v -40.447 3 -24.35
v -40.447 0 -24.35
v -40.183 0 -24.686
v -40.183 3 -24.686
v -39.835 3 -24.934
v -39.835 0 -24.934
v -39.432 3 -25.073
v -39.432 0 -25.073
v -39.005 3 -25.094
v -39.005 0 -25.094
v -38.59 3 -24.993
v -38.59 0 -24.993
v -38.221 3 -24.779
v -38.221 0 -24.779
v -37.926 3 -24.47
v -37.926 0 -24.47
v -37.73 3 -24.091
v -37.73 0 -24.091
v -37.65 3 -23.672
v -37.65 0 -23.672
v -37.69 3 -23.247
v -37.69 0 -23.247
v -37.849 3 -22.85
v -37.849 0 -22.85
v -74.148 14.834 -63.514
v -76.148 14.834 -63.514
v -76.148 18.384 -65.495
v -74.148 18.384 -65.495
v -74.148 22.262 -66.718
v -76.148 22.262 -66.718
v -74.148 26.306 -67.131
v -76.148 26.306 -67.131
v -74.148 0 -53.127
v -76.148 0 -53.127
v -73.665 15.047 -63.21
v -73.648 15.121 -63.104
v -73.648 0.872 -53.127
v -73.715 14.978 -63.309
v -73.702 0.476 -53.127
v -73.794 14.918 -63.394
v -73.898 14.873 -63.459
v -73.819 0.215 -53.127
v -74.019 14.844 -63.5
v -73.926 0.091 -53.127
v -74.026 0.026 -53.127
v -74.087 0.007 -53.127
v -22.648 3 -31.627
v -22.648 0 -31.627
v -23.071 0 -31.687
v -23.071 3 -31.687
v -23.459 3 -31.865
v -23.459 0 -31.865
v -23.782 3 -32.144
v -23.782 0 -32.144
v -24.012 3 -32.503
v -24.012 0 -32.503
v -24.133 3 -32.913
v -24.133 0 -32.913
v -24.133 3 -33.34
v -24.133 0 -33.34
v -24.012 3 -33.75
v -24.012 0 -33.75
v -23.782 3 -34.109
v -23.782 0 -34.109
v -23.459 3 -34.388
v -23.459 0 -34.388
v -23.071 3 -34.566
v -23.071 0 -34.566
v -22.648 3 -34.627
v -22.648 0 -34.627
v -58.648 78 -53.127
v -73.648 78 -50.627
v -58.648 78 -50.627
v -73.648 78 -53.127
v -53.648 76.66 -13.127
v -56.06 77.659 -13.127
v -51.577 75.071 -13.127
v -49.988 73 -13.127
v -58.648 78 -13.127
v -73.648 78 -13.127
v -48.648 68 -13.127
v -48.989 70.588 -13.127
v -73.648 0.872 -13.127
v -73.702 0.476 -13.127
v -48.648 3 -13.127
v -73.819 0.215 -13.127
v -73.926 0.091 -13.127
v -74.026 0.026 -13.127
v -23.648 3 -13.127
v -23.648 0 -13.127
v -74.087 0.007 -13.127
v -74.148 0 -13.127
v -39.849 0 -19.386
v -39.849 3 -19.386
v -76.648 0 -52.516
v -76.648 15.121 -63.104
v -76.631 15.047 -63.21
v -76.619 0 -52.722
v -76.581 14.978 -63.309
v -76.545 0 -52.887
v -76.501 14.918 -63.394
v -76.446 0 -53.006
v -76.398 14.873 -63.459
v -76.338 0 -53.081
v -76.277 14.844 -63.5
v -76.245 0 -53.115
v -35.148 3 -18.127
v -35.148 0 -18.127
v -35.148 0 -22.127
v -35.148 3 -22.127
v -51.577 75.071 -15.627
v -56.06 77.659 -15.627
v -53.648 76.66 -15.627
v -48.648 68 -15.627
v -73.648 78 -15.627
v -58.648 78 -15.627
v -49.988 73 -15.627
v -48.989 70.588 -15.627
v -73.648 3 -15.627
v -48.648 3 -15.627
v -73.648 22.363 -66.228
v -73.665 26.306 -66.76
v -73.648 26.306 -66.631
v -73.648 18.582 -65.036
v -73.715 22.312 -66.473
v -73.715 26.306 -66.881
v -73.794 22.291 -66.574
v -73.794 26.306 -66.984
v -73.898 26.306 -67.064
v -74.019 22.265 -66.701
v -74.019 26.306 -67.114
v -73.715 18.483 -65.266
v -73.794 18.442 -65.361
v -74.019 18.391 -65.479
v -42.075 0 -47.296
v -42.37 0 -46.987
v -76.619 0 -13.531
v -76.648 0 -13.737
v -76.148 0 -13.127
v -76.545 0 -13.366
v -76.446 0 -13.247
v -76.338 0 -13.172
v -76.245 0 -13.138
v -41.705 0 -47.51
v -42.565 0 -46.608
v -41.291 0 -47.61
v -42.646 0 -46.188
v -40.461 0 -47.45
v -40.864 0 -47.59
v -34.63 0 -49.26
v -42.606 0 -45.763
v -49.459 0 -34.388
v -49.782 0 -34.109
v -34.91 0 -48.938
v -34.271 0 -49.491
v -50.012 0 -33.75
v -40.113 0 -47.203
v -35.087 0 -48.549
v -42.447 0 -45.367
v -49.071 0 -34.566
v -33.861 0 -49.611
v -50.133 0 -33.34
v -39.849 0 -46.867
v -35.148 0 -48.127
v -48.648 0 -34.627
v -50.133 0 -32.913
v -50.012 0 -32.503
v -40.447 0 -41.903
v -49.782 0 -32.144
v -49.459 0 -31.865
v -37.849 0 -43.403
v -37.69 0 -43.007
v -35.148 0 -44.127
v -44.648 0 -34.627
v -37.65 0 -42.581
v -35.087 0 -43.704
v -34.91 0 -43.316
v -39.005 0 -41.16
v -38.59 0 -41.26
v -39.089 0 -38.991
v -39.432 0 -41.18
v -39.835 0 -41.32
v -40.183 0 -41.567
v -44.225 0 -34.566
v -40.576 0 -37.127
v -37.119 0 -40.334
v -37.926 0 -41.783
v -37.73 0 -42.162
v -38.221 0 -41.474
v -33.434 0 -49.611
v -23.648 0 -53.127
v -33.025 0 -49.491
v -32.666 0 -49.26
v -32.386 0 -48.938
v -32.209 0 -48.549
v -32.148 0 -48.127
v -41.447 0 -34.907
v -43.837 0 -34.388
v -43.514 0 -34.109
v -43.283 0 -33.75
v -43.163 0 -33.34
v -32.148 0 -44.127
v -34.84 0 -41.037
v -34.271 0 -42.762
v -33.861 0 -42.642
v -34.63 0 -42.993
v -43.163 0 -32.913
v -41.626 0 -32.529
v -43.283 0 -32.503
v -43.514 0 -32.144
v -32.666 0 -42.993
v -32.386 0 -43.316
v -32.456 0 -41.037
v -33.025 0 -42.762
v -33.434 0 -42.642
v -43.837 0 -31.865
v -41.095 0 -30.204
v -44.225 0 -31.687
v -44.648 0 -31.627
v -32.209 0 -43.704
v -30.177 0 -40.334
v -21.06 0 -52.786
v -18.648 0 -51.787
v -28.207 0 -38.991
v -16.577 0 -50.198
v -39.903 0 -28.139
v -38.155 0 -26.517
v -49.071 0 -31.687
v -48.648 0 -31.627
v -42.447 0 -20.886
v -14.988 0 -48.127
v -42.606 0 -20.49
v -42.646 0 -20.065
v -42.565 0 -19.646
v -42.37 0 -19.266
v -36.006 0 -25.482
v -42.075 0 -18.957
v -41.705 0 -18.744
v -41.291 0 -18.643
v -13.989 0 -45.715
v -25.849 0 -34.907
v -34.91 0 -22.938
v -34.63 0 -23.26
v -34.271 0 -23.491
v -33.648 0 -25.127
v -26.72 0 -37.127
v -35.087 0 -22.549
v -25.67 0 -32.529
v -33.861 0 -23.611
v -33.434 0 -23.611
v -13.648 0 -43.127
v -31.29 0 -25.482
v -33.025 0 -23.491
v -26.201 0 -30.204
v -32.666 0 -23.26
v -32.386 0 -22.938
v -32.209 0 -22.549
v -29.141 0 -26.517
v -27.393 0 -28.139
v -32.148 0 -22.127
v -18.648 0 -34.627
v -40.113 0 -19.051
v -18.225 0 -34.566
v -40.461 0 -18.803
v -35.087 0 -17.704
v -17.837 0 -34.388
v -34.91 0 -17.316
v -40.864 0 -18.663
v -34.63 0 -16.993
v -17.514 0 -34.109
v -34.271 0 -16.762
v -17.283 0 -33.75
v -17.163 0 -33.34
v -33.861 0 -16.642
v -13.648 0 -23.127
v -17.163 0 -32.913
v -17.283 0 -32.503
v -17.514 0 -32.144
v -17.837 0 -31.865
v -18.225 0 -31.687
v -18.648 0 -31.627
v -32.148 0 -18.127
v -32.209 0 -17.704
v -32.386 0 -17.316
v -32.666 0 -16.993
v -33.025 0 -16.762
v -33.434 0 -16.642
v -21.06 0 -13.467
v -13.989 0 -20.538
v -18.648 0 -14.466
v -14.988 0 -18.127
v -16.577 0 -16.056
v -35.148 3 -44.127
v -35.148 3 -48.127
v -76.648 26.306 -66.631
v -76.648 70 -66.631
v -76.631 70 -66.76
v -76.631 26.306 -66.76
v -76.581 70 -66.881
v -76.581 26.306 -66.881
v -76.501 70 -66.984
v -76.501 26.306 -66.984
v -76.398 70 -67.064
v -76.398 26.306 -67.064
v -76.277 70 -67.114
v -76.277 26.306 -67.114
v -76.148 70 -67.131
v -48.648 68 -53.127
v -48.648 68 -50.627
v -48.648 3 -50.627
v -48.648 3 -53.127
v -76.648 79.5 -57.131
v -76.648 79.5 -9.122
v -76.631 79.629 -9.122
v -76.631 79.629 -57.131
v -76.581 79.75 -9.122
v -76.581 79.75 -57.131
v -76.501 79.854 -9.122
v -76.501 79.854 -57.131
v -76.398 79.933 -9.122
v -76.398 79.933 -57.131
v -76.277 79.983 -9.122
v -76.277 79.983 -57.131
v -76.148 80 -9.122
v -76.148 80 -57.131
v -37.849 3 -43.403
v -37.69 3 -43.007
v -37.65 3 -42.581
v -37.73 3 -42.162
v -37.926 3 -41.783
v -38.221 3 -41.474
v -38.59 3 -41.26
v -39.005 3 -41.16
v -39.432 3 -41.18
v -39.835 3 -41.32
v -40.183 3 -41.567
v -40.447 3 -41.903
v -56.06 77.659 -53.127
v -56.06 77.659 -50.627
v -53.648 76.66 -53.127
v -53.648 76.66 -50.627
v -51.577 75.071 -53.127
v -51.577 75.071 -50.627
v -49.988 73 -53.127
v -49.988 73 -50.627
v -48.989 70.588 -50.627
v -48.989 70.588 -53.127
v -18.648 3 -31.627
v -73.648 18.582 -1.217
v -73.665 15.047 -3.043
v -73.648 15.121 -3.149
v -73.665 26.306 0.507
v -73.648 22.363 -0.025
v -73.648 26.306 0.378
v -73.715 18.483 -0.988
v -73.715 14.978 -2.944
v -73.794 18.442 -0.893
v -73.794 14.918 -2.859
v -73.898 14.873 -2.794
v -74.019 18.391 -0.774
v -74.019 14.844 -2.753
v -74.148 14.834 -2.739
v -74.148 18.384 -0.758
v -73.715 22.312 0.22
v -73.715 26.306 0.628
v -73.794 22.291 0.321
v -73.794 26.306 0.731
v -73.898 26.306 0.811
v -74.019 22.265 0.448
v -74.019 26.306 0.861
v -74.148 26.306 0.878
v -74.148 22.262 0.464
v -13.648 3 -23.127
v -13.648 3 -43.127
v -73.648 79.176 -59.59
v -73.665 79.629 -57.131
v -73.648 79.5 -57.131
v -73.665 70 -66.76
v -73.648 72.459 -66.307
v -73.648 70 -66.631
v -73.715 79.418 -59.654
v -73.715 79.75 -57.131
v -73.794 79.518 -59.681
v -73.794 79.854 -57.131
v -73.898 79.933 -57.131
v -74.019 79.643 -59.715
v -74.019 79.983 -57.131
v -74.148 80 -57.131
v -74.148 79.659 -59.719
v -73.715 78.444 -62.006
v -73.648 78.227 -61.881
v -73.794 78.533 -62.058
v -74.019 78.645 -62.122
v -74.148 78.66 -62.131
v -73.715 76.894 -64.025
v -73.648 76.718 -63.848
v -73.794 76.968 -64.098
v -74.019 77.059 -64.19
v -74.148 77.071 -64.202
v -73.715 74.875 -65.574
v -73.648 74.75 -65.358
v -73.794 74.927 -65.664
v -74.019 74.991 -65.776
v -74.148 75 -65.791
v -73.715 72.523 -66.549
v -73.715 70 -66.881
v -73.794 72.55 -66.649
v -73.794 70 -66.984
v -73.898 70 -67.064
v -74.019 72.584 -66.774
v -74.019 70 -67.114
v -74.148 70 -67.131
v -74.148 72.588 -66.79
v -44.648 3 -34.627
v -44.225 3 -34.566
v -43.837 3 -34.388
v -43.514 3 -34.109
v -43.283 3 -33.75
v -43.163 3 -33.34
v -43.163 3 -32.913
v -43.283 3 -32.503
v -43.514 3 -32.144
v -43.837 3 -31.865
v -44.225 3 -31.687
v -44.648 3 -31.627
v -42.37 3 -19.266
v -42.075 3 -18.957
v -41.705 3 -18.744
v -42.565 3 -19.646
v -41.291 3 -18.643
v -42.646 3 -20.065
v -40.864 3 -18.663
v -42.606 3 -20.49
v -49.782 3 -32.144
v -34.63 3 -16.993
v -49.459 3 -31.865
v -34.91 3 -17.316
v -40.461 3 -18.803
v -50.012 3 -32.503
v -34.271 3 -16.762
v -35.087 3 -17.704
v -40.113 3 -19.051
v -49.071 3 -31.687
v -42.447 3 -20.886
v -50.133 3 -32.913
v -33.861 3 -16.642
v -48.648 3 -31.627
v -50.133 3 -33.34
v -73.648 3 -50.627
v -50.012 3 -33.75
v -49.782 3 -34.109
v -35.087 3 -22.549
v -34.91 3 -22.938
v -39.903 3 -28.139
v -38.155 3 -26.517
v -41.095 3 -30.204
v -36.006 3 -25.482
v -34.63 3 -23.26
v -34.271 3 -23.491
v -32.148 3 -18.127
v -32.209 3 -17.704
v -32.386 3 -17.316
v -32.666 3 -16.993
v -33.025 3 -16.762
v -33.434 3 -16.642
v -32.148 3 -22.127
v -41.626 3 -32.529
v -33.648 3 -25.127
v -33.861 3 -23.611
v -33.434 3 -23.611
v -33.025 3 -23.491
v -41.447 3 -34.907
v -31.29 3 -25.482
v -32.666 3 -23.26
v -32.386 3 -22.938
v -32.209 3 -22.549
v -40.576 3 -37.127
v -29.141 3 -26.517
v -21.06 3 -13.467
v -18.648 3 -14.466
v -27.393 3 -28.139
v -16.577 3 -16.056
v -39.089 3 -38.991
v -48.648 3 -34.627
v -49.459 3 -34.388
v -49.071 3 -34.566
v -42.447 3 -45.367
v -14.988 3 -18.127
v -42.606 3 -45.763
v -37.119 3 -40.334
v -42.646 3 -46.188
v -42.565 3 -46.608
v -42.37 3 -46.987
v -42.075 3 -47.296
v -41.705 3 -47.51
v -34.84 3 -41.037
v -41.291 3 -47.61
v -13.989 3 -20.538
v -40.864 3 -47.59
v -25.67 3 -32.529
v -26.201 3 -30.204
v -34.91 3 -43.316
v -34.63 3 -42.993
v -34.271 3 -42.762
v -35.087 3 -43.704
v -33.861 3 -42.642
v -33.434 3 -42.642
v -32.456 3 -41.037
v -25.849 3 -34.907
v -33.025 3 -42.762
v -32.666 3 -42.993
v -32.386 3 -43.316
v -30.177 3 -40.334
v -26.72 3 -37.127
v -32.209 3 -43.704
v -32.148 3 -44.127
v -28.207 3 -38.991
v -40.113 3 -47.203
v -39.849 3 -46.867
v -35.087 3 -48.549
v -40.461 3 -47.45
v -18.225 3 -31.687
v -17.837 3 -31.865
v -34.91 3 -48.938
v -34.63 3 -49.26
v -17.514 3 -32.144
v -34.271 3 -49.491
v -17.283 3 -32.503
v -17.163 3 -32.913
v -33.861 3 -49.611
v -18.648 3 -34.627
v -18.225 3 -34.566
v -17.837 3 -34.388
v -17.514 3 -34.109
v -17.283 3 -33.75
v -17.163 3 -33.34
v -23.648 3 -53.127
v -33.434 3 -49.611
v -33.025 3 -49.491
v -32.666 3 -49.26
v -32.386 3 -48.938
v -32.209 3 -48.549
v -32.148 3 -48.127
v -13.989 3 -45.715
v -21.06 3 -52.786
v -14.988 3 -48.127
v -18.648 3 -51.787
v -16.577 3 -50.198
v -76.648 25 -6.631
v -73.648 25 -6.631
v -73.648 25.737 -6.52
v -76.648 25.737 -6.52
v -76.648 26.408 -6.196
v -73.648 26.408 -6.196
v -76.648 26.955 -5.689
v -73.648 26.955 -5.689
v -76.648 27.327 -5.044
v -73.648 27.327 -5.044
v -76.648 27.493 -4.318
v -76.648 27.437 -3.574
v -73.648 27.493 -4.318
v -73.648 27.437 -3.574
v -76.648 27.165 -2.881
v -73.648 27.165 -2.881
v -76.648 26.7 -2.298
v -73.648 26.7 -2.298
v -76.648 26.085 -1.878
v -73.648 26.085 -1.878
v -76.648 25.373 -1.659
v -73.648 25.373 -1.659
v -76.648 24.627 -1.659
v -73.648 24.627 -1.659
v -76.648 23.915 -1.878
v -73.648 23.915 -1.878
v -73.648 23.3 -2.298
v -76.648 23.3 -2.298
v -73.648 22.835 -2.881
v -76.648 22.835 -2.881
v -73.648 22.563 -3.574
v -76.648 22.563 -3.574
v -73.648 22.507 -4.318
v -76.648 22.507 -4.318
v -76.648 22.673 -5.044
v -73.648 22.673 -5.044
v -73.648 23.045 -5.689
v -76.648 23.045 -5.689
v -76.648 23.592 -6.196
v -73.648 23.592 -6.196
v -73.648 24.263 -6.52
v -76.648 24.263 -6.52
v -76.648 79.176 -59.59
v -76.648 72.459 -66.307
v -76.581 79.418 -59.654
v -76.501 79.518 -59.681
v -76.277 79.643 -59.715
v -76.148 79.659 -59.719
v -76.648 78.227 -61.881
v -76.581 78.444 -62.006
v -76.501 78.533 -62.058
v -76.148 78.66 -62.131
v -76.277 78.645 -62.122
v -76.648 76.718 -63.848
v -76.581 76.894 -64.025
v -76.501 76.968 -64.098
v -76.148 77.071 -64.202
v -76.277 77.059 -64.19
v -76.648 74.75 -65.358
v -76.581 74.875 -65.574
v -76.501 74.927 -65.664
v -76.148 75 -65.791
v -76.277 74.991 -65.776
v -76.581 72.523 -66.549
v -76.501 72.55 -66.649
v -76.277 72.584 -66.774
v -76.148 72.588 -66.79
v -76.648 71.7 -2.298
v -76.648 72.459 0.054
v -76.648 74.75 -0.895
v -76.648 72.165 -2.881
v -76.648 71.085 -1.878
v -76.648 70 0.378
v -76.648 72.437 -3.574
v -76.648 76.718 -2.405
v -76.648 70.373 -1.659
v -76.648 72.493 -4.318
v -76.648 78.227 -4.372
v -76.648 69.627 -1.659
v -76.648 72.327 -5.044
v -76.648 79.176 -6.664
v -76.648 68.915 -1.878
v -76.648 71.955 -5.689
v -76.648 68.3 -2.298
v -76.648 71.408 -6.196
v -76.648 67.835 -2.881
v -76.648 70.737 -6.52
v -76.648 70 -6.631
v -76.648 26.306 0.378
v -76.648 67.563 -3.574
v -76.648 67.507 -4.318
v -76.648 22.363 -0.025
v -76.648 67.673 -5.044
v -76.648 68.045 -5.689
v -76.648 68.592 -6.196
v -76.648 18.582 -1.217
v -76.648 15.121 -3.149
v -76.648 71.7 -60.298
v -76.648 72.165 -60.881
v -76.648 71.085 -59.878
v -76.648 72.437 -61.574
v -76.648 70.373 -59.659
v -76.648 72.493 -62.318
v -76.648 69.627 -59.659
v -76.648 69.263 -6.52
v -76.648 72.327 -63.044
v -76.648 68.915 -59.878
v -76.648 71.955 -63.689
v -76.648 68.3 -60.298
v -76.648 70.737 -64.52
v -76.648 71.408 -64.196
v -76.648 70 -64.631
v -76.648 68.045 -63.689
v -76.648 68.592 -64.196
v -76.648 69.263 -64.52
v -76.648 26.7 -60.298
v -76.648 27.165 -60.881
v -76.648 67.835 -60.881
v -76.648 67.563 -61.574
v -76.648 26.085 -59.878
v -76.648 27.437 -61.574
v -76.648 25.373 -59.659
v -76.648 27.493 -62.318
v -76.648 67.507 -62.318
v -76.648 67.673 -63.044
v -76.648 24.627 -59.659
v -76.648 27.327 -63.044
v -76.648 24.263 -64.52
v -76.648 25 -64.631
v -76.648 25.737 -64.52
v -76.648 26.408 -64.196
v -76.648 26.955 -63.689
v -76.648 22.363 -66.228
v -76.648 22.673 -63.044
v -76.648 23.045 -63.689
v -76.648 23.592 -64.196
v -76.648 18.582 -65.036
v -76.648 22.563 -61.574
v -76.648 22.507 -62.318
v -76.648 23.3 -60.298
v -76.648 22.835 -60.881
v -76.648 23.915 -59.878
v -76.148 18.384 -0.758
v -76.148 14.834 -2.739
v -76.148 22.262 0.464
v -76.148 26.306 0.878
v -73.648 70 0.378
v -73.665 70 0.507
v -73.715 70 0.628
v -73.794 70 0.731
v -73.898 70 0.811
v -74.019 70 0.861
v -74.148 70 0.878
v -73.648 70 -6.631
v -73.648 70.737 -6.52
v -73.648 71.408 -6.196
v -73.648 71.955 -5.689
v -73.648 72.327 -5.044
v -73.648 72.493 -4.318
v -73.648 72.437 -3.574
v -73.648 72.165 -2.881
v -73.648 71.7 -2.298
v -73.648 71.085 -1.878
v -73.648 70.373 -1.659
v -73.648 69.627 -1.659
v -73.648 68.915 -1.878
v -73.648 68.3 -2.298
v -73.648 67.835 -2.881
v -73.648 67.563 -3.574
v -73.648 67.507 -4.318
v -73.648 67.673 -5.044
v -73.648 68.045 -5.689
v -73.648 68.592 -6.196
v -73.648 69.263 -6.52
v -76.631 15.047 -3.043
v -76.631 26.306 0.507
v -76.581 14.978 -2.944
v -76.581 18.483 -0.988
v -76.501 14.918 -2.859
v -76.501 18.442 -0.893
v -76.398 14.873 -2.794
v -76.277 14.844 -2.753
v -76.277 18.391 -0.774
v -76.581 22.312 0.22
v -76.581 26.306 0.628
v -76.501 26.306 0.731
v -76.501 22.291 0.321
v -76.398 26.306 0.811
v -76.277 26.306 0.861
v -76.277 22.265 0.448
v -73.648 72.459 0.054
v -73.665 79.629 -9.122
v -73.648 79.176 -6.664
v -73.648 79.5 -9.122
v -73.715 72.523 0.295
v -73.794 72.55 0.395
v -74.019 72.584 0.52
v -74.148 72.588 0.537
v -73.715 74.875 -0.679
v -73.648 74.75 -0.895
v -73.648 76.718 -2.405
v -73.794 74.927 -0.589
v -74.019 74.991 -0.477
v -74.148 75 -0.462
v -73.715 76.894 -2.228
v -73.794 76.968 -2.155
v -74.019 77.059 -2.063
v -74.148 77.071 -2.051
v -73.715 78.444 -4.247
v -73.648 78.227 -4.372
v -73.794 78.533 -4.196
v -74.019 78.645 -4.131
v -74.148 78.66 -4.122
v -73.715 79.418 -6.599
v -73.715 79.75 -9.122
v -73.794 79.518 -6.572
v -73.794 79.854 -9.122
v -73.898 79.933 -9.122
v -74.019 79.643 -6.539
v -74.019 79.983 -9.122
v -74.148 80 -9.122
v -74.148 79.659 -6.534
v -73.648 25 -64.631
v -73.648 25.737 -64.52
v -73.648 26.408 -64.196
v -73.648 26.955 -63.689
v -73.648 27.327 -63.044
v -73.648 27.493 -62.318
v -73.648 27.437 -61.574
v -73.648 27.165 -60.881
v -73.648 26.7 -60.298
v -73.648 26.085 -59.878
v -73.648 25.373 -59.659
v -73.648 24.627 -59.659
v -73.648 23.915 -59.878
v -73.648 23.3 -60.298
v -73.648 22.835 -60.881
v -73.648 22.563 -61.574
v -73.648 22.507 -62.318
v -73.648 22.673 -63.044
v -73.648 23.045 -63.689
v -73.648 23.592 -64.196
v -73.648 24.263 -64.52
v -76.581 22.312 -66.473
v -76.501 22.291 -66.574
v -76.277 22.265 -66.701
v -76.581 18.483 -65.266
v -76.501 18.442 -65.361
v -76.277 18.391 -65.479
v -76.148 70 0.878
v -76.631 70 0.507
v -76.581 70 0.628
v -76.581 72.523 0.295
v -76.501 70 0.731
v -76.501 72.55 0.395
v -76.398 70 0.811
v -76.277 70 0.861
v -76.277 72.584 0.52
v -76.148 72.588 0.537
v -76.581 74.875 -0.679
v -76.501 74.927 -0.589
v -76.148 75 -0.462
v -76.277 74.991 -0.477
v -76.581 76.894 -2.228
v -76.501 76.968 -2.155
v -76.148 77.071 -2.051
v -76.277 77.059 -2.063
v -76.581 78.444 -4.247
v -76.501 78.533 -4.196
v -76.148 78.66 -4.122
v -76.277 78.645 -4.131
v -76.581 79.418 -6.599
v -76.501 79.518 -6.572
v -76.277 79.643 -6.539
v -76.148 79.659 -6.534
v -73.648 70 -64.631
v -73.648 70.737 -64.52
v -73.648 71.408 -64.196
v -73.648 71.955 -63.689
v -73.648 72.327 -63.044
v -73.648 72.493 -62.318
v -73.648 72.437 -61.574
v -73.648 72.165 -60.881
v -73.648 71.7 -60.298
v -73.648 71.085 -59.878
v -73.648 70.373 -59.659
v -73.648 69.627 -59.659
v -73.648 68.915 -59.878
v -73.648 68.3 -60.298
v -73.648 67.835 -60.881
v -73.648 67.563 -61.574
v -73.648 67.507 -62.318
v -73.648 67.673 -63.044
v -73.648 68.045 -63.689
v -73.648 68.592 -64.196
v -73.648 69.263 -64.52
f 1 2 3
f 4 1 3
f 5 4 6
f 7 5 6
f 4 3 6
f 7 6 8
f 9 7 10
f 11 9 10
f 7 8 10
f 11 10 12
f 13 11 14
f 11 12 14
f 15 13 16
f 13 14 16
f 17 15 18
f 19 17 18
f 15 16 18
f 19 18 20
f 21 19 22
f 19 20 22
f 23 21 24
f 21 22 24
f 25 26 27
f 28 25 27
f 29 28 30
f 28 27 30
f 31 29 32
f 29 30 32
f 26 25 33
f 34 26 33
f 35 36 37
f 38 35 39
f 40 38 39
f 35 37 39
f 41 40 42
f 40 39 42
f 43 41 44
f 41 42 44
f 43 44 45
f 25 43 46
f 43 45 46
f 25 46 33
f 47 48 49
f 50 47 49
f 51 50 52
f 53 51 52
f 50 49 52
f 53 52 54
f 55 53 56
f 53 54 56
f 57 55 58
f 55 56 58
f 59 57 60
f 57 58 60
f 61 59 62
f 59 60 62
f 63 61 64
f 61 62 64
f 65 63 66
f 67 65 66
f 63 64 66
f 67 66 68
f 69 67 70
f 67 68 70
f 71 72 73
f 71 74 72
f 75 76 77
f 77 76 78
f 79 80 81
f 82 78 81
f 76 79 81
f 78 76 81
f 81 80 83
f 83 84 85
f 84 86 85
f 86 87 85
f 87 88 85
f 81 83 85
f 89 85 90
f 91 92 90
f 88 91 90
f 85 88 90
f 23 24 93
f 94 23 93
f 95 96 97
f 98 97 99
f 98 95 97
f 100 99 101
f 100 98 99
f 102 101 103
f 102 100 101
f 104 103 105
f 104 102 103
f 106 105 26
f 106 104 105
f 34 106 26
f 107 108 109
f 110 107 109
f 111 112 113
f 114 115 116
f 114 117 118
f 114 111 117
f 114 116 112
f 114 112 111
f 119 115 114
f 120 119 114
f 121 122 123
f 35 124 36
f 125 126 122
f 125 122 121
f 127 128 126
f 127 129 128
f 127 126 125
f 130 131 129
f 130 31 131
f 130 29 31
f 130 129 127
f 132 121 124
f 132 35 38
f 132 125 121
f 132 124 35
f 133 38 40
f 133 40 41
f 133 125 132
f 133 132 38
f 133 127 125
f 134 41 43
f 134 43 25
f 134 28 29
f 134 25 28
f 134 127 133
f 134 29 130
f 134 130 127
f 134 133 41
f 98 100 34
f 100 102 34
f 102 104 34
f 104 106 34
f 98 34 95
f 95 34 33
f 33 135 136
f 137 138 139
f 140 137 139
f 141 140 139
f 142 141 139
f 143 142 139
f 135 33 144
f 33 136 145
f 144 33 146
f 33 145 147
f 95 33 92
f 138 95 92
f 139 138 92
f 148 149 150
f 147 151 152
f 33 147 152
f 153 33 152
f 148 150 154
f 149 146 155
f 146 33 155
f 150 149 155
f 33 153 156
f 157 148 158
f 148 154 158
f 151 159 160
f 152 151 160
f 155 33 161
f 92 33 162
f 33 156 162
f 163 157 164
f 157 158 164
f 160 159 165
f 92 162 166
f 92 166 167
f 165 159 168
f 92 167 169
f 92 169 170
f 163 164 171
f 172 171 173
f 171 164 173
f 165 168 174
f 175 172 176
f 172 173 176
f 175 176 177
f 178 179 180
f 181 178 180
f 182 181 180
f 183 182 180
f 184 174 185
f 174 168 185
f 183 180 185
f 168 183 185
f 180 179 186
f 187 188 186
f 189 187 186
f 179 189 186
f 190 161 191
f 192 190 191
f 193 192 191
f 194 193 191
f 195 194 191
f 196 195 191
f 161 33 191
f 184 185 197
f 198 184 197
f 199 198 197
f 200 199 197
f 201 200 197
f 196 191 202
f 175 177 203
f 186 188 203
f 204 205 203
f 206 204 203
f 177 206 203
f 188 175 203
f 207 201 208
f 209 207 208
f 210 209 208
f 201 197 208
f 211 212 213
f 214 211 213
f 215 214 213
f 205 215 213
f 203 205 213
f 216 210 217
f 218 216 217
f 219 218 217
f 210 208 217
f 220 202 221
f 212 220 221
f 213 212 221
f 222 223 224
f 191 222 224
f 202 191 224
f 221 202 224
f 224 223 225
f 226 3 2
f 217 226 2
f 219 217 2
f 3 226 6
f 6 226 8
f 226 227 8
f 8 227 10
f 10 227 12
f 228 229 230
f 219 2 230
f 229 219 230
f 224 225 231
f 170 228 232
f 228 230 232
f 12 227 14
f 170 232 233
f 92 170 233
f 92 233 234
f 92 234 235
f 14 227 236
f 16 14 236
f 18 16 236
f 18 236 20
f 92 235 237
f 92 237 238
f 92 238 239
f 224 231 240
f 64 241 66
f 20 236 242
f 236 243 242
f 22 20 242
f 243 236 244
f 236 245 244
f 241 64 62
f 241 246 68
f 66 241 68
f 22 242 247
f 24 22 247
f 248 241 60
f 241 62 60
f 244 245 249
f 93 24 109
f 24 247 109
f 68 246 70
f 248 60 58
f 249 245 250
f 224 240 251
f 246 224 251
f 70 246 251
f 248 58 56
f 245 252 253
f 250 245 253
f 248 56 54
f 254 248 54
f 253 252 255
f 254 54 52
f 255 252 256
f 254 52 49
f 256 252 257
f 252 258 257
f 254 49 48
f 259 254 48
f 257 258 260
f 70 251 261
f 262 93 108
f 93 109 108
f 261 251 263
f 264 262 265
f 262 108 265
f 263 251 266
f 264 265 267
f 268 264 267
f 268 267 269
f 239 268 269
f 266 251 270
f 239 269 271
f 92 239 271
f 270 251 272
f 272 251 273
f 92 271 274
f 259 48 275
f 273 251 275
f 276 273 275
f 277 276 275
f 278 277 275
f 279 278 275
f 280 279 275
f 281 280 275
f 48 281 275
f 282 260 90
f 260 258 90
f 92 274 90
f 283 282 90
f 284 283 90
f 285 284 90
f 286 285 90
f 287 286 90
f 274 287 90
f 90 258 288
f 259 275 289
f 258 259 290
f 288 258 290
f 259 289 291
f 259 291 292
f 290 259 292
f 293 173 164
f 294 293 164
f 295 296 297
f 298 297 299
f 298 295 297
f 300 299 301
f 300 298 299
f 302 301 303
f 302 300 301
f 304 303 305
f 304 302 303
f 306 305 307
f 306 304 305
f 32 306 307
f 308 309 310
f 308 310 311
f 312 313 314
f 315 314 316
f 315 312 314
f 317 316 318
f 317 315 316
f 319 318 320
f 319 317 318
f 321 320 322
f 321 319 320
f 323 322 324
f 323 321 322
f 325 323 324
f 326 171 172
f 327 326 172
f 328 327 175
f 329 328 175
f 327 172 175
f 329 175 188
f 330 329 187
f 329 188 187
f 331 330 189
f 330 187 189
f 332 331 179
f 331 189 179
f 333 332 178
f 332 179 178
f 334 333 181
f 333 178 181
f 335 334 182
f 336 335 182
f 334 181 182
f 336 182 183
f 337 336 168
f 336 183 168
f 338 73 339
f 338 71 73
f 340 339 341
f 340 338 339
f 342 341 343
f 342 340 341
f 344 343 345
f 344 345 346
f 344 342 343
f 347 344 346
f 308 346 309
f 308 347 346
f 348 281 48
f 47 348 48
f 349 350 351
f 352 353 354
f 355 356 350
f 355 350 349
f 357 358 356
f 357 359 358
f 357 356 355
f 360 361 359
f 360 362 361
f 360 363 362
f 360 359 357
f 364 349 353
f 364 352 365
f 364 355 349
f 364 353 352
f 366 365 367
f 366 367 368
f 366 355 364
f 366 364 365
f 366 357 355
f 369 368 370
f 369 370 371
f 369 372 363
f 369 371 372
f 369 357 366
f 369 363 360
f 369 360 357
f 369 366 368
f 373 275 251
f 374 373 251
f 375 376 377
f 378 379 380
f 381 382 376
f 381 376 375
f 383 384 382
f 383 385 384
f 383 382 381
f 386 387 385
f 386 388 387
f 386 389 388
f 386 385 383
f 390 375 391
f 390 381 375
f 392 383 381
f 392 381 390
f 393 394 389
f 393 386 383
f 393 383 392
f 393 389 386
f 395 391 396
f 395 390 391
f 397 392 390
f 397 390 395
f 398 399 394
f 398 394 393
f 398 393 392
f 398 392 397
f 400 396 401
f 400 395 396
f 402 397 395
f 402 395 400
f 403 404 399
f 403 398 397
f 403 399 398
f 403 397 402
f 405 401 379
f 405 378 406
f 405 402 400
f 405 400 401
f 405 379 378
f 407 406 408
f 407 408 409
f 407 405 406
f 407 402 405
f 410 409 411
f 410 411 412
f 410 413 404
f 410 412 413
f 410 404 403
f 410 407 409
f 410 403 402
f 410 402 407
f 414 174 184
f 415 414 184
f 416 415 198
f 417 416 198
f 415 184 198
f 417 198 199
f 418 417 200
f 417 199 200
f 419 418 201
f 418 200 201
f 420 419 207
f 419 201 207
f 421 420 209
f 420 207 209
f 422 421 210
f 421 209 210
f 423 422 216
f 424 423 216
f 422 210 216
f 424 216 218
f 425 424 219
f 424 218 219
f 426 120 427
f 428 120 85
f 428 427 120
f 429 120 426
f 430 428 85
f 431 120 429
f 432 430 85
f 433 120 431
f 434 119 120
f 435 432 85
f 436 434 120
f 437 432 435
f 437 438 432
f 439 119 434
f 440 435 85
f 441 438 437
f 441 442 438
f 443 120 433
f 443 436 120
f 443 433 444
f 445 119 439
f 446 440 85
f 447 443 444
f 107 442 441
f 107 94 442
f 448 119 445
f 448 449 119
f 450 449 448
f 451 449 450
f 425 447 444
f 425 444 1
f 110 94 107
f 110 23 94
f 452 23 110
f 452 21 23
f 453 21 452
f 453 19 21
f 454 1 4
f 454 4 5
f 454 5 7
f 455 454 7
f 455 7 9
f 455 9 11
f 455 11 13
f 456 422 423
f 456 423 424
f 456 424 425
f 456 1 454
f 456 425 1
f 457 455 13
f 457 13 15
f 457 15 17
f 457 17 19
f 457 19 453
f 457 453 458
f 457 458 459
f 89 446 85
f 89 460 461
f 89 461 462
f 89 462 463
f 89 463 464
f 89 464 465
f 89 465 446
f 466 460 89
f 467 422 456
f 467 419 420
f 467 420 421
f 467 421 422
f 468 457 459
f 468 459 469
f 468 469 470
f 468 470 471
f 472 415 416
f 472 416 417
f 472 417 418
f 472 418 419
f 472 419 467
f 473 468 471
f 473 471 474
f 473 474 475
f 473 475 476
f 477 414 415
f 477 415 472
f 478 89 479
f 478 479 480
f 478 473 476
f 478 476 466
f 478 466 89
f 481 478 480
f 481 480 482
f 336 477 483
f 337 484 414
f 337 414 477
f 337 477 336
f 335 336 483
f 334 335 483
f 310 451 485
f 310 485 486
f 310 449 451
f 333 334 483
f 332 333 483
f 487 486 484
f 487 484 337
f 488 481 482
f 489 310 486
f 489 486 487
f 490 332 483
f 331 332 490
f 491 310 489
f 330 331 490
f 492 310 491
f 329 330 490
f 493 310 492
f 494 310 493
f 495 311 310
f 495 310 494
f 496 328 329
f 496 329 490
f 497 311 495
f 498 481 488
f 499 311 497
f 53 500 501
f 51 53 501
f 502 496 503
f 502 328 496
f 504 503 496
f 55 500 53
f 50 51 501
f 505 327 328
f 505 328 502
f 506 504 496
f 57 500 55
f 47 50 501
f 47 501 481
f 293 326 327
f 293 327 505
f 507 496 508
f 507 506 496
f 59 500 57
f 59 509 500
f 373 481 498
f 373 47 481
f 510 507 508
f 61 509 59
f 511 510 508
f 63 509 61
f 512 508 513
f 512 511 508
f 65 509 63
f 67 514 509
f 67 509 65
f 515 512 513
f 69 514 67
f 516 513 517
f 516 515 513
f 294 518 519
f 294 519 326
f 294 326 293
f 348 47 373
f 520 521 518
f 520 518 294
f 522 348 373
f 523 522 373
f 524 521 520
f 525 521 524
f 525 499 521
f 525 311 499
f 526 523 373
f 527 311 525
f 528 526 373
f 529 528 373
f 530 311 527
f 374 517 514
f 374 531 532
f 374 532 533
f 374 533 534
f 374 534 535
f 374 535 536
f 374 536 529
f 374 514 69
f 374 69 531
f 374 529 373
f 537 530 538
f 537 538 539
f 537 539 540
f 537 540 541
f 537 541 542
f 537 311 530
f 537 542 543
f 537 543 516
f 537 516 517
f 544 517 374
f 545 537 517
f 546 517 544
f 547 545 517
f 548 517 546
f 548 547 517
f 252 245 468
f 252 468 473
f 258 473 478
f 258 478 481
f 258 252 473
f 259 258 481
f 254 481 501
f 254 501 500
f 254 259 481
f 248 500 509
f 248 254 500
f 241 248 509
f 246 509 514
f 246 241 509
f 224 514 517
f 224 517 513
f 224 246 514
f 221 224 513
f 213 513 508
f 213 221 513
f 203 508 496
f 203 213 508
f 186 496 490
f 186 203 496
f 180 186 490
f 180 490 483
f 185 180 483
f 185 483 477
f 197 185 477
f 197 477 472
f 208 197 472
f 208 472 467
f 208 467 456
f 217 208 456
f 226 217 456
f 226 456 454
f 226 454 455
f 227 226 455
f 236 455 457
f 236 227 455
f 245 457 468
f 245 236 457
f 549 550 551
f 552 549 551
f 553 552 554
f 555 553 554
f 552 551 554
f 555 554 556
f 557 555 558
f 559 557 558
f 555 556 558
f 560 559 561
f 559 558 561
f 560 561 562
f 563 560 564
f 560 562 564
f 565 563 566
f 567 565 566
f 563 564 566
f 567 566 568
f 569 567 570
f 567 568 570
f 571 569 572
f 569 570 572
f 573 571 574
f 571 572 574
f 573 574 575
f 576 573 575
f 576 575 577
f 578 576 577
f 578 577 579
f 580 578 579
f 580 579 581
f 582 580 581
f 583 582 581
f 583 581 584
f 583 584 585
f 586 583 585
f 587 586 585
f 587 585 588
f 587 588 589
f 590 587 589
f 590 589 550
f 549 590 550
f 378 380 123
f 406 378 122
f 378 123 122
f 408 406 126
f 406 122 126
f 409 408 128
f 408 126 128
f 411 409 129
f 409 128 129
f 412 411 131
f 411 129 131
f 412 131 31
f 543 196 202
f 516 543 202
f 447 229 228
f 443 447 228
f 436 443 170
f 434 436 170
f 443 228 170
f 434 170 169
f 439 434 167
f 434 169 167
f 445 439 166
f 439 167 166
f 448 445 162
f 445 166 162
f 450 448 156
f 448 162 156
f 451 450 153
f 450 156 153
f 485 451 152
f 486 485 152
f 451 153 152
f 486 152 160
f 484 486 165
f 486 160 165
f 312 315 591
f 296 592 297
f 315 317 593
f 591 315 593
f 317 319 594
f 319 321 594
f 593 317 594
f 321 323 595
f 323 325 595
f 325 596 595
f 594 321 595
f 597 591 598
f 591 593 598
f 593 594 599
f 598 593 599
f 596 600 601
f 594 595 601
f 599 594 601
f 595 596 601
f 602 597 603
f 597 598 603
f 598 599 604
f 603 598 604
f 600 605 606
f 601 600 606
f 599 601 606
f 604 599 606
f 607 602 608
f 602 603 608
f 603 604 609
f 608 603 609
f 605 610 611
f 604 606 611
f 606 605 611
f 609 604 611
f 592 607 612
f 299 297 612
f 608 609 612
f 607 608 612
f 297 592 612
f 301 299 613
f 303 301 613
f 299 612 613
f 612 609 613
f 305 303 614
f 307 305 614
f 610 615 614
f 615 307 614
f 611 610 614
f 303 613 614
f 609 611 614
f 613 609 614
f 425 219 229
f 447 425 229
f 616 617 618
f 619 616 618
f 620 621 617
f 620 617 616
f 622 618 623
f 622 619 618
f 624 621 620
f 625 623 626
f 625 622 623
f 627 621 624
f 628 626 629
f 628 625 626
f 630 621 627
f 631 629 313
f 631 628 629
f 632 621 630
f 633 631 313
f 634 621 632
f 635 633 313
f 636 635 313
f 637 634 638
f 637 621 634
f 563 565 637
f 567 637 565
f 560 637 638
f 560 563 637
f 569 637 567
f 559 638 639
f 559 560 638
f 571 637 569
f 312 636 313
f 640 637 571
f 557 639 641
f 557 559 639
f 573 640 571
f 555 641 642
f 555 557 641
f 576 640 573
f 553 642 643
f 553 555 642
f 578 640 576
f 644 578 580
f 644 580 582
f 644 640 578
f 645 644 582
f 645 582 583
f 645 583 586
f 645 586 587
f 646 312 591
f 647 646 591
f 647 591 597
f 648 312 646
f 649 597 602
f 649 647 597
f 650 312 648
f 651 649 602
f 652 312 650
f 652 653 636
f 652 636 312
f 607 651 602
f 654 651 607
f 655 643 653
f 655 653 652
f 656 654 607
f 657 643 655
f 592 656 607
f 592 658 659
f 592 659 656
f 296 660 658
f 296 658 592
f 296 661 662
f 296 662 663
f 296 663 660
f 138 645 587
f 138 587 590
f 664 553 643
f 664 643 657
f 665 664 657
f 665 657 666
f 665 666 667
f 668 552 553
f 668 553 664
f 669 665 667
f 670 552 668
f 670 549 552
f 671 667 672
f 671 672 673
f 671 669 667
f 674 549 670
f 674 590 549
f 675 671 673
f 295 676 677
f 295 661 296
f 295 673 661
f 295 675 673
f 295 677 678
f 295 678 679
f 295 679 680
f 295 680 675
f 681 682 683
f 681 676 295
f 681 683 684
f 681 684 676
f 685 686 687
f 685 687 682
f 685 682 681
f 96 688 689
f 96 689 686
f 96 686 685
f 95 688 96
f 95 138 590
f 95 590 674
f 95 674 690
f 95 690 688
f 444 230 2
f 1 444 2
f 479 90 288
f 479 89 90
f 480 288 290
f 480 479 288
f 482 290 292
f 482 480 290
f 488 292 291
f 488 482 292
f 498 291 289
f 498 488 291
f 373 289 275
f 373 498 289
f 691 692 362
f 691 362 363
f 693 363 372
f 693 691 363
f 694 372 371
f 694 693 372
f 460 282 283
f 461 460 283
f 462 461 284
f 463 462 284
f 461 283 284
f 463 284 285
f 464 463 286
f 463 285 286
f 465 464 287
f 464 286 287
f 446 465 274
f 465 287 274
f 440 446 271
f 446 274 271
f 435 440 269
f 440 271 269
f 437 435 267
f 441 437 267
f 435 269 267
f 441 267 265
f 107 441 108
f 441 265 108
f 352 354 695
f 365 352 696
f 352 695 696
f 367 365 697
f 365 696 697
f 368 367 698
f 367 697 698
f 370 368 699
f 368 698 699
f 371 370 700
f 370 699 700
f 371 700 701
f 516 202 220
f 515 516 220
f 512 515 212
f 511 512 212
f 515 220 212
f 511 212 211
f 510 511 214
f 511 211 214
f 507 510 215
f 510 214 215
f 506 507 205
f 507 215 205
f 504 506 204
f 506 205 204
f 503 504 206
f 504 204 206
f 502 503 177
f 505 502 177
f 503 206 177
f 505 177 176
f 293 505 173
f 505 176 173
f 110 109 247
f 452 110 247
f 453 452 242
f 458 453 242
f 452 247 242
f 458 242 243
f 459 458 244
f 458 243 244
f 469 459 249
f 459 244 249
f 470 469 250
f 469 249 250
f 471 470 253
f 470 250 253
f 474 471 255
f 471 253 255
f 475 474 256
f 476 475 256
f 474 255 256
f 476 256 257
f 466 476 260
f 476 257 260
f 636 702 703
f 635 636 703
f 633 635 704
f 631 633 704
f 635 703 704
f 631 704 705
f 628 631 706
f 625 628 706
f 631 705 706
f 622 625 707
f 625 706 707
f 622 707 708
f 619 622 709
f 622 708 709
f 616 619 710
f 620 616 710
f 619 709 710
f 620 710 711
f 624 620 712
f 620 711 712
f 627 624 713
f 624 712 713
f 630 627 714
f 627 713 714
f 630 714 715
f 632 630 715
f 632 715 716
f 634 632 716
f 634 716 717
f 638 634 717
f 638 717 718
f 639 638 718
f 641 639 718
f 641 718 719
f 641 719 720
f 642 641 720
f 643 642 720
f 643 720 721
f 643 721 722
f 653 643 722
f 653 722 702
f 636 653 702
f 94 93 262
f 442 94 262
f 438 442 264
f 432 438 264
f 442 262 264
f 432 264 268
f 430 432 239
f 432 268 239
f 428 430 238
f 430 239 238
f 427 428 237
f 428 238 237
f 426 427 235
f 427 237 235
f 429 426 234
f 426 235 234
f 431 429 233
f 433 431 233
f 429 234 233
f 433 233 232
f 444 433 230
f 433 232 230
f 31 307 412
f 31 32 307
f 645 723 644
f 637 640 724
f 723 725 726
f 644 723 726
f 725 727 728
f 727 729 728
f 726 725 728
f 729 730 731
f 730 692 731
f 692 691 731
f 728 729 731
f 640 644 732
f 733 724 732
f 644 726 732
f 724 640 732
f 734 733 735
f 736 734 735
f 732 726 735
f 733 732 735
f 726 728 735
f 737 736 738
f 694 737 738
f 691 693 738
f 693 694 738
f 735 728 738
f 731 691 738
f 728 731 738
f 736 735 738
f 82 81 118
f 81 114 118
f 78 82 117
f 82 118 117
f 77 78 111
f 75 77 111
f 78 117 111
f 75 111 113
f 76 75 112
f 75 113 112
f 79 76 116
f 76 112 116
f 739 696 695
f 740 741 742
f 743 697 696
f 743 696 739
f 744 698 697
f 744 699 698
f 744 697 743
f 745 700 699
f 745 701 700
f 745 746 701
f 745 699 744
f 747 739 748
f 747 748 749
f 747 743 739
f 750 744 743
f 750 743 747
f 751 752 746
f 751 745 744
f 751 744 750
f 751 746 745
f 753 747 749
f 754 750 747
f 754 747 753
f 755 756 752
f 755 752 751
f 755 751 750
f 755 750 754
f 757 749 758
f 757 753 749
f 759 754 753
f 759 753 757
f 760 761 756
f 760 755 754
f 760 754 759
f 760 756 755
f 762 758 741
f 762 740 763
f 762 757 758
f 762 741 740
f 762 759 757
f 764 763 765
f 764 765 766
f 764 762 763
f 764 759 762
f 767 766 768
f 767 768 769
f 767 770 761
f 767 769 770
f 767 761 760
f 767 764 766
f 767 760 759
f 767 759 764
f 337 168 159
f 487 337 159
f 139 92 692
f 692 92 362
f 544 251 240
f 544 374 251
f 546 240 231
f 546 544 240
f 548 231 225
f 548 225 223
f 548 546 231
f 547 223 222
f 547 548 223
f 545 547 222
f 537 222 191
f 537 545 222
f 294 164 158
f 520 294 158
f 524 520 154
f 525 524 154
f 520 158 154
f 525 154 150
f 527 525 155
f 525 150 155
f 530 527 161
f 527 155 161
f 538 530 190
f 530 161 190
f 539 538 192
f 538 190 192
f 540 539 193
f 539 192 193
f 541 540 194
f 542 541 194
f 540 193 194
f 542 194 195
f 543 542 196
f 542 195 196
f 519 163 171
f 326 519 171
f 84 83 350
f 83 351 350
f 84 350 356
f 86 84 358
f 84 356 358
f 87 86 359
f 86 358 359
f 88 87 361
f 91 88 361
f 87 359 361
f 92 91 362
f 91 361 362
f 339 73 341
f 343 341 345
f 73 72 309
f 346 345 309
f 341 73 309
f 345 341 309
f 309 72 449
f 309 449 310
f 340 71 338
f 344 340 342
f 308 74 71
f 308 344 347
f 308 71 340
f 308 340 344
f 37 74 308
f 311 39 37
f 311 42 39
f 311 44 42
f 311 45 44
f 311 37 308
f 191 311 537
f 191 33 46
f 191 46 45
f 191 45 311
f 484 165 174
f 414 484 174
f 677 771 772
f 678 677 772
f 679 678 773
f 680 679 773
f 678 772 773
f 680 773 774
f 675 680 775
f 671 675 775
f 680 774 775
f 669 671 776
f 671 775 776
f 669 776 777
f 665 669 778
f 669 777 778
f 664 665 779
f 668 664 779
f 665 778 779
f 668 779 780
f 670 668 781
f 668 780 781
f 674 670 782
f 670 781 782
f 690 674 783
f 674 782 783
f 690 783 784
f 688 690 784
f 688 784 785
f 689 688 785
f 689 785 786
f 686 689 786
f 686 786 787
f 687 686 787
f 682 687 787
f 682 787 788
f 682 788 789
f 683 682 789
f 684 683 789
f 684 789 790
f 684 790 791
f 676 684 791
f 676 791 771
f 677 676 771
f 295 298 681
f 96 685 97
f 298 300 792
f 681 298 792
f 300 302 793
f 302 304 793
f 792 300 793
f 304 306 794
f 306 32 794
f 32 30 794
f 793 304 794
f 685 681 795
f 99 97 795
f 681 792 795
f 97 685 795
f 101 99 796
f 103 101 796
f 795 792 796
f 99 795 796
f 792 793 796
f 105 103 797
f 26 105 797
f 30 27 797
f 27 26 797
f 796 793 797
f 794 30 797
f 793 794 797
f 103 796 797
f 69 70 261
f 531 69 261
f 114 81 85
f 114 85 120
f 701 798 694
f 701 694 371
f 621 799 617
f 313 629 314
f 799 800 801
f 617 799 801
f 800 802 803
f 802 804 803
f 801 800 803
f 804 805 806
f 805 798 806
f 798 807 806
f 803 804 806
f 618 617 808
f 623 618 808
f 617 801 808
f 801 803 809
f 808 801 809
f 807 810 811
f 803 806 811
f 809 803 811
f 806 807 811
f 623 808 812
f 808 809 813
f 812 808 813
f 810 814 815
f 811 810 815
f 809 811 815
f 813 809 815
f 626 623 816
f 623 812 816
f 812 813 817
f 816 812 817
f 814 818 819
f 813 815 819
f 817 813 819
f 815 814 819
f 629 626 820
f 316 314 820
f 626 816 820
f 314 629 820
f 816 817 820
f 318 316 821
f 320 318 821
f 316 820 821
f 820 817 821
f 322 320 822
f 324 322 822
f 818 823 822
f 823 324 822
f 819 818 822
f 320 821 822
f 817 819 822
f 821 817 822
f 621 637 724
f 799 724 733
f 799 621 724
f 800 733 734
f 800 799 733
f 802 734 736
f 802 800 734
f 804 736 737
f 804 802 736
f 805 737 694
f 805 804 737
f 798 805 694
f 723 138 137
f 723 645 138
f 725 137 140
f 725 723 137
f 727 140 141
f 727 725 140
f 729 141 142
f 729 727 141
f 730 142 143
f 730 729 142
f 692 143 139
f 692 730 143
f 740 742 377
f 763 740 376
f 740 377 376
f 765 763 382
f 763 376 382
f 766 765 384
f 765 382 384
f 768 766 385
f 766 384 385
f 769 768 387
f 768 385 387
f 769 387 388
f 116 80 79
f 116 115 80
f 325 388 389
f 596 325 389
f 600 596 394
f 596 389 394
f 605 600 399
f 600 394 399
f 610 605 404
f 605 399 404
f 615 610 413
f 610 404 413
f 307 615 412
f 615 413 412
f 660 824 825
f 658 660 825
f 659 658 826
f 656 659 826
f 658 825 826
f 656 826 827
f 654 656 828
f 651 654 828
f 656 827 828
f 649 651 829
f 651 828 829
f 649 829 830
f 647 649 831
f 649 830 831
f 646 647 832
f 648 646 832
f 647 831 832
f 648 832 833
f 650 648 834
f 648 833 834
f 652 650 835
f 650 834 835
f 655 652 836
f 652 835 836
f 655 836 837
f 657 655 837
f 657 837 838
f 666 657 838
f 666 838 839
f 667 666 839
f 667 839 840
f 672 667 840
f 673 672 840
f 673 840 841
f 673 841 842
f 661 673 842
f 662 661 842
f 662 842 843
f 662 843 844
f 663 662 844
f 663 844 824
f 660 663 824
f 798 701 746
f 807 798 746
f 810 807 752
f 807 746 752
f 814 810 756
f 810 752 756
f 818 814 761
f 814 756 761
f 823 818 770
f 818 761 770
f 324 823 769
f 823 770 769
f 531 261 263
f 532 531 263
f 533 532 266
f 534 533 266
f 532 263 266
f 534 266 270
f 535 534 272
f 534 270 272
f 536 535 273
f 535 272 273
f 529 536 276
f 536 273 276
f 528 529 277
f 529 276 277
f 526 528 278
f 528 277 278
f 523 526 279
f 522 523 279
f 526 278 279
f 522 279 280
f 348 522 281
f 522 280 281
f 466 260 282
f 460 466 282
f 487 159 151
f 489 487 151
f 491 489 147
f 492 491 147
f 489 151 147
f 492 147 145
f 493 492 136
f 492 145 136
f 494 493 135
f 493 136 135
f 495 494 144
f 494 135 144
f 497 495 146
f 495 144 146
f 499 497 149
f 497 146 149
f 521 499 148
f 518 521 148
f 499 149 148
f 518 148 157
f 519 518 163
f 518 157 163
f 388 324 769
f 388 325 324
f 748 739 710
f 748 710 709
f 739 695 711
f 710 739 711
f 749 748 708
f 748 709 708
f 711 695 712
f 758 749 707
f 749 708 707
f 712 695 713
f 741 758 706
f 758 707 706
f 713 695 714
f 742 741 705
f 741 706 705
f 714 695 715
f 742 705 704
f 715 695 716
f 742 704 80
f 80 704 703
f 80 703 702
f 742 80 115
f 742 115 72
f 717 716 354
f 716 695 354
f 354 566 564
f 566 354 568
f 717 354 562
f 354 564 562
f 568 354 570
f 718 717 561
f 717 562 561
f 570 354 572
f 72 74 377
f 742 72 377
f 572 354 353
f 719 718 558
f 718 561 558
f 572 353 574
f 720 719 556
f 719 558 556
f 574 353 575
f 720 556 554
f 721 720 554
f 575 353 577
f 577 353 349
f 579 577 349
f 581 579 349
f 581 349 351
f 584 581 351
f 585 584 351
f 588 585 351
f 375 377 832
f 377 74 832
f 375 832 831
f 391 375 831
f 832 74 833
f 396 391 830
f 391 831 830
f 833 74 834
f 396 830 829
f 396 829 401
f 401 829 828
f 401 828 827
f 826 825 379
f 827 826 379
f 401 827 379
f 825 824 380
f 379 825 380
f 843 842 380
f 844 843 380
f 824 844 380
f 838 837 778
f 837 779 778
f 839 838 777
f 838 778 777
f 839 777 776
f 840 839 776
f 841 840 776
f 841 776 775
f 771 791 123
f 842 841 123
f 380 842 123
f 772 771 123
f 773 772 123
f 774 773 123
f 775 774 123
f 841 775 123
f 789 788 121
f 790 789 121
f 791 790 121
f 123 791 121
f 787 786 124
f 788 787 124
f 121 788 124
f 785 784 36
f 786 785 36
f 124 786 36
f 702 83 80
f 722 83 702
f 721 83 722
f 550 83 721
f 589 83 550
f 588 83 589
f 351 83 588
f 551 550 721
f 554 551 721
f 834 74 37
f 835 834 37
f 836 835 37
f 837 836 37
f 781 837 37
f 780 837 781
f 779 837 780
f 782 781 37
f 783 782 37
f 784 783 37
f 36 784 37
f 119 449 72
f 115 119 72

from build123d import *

# Parameters (mm, degrees)
SKETCH_1_W          = 60
SKETCH_1_H          = 40
SKETCH_1_R          = 8
EXTRUDE_1_DEPTH     = 3
EXTRUDE_2_DEPTH     = 3
SKETCH_6_W          = 3
SKETCH_6_H          = 68.008301529
EXTRUDE_3_DEPTH     = 60
SKETCH_7_R          = 2.5
CUT_EXTRUDE_1_DEPTH = 121.443081137
FILLET_1_R          = 10
FILLET_2_R          = 20
FILLET_4_R          = 10
FILLET_12_R         = 0.5
FILLET_13_R         = 0.5
SKETCH_10_W         = 25
SKETCH_10_H         = 2.5
EXTRUDE_6_DEPTH     = 75
FILLET_16_R         = 10


with BuildPart() as part:
    # 草图1 → 凸台-拉伸1 (new body)
    with BuildSketch(Plane(origin=(0, 0, 0), x_dir=(1, 0, 0), z_dir=(0, 1, 0))):
        with Locations((-43.647943628, 33.126585816)):
            Rectangle(SKETCH_1_W, SKETCH_1_H)
        with Locations(Location((-33.647943628, 33.126585816, 0), (0, 0, 270))):
            Circle(SKETCH_1_R, mode=Mode.SUBTRACT)
        with BuildLine():
            Line((-18.647943628, 31.626585816), (-22.647943628, 31.626585816))
            ThreePointArc((-22.647943628, 31.626585816), (-24.147943628, 33.126585816), (-22.647943628, 34.626585816))
            Line((-22.647943628, 34.626585816), (-18.647943628, 34.626585816))
            ThreePointArc((-18.647943628, 34.626585816), (-17.147943628, 33.126585816), (-18.647943628, 31.626585816))
        make_face(mode=Mode.SUBTRACT)
        with BuildLine():
            Line((-35.147943628, 18.126585816), (-35.147943628, 22.126585816))
            ThreePointArc((-35.147943628, 22.126585816), (-33.647943628, 23.626585816), (-32.147943628, 22.126585816))
            Line((-32.147943628, 22.126585816), (-32.147943628, 18.126585816))
            ThreePointArc((-32.147943628, 18.126585816), (-33.647943628, 16.626585816), (-35.147943628, 18.126585816))
        make_face(mode=Mode.SUBTRACT)
        with BuildLine():
            Line((-48.647943628, 34.626585816), (-44.647943628, 34.626585816))
            ThreePointArc((-44.647943628, 34.626585816), (-43.147943628, 33.126585816), (-44.647943628, 31.626585816))
            Line((-44.647943628, 31.626585816), (-48.647943628, 31.626585816))
            ThreePointArc((-48.647943628, 31.626585816), (-50.147943628, 33.126585816), (-48.647943628, 34.626585816))
        make_face(mode=Mode.SUBTRACT)
        with BuildLine():
            Line((-32.147943628, 48.126585816), (-32.147943628, 44.126585816))
            ThreePointArc((-32.147943628, 44.126585816), (-33.647943628, 42.626585816), (-35.147943628, 44.126585816))
            Line((-35.147943628, 44.126585816), (-35.147943628, 48.126585816))
            ThreePointArc((-35.147943628, 48.126585816), (-33.647943628, 49.626585816), (-32.147943628, 48.126585816))
        make_face(mode=Mode.SUBTRACT)
        with BuildLine():
            Line((-42.446981734, 20.88620476), (-40.446981734, 24.350306375))
            ThreePointArc((-40.446981734, 24.350306375), (-38.397943628, 24.89934448), (-37.848905522, 22.850306375))
            Line((-37.848905522, 22.850306375), (-39.848905522, 19.38620476))
            ThreePointArc((-39.848905522, 19.38620476), (-41.897943628, 18.837166654), (-42.446981734, 20.88620476))
        make_face(mode=Mode.SUBTRACT)
        with BuildLine():
            Line((-39.848905522, 46.866966873), (-37.848905522, 43.402865258))
            ThreePointArc((-37.848905522, 43.402865258), (-38.397943628, 41.353827152), (-40.446981734, 41.902865258))
            Line((-40.446981734, 41.902865258), (-42.446981734, 45.366966873))
            ThreePointArc((-42.446981734, 45.366966873), (-41.897943628, 47.416004979), (-39.848905522, 46.866966873))
        make_face(mode=Mode.SUBTRACT)
    extrude(amount=EXTRUDE_1_DEPTH)

    # 草图2 → 凸台-拉伸2 (add)
    with BuildSketch(Plane.ZY.offset(73.647943628)):
        Polygon((-67.130736581, 20), (-53.126585816, 0), (-13.126585816, 0), (0.877564948, 20), align=None)
    extrude(amount=EXTRUDE_2_DEPTH)

    # 草图6 → 凸台-拉伸3 (add)
    with BuildSketch(Plane(origin=(0, 20, 0), x_dir=(1, 0, 0), z_dir=(0, 1, 0))):
        with Locations((-75.147943628, 33.126585817)):
            Rectangle(SKETCH_6_W, SKETCH_6_H)
    extrude(amount=EXTRUDE_3_DEPTH)

    # 草图7 → 切除-拉伸1 (cut, through all)
    with BuildSketch(Plane(origin=(-73.647943628, 0, 0), x_dir=(0, 0, -1), z_dir=(1, 0, 0))):
        with Locations((62.130736581, 25)):
            Circle(SKETCH_7_R)
        with Locations((4.130736581, 25)):
            Circle(SKETCH_7_R)
        with Locations((62.130736581, 70)):
            Circle(SKETCH_7_R)
        with Locations((4.130736581, 70)):
            Circle(SKETCH_7_R)
    extrude(amount=-CUT_EXTRUDE_1_DEPTH, mode=Mode.SUBTRACT)

    # 圆角1
    fillet_1_edges = [part.edges().sort_by_distance(p)[0] for p in [
        (-13.647943628, 1.5, -53.126585816),
        (-13.647943628, 1.5, -13.126585816),
    ]]
    fillet(fillet_1_edges, radius=FILLET_1_R)

    # 圆角2
    fillet_2_edges = [part.edges().sort_by_distance(p)[0] for p in [
        (-75.147943628, 20, 0.877564948),
        (-75.147943628, 20, -67.130736581),
    ]]
    fillet(fillet_2_edges, radius=FILLET_2_R)

    # 圆角4
    fillet_4_edges = [part.edges().sort_by_distance(p)[0] for p in [
        (-75.147943628, 80, -67.130736581),
        (-75.147943628, 80, 0.877564948),
    ]]
    fillet(fillet_4_edges, radius=FILLET_4_R)

    # 圆角12
    fillet_12_edges = [part.edges().sort_by_distance(p)[0] for p in [
        (-73.647943628, 7.417223525, -7.932989991),
        (-73.647943628, 7.417223525, -58.320181641),
        (-73.647943628, 20.291859787, -0.048096037),
        (-73.647943628, 20.291859787, -66.205075596),
        (-73.647943628, 80, -33.126585816),
        (-73.647943628, 48.152987889, -67.130736581),
        (-73.647943628, 48.152987889, 0.877564948),
        (-73.647943628, 77.071067812, -64.201804393),
        (-73.647943628, 77.071067812, -2.05136724),
    ]]
    fillet(fillet_12_edges, radius=FILLET_12_R)

    # 圆角13
    fillet_13_edges = [part.edges().sort_by_distance(p)[0] for p in [
        (-76.647943628, 7.417223525, -7.932989991),
        (-76.647943628, 7.417223525, -58.320181641),
        (-76.647943628, 20.291859787, -0.048096037),
        (-76.647943628, 20.291859787, -66.205075596),
        (-76.647943628, 80, -33.126585816),
        (-76.647943628, 48.152987889, 0.877564948),
        (-76.647943628, 48.152987889, -67.130736581),
        (-76.647943628, 77.071067812, -64.201804393),
        (-76.647943628, 77.071067812, -2.05136724),
    ]]
    fillet(fillet_13_edges, radius=FILLET_13_R)

    # 草图10 → 凸台-拉伸6 (add)
    with BuildSketch(Plane(origin=(0, 3, 0), x_dir=(1, 0, 0), z_dir=(0, 1, 0))):
        with Locations((-61.147943628, 51.876585816)):
            Rectangle(SKETCH_10_W, SKETCH_10_H)
        with Locations((-61.147943628, 14.376585816)):
            Rectangle(SKETCH_10_W, SKETCH_10_H)
    extrude(amount=EXTRUDE_6_DEPTH)

    # 圆角16
    fillet_16_edges = [part.edges().sort_by_distance(p)[0] for p in [
        (-48.647943628, 78, -51.876585816),
        (-48.647943628, 78, -14.376585816),
    ]]
    fillet(fillet_16_edges, radius=FILLET_16_R)


solid = part.part
